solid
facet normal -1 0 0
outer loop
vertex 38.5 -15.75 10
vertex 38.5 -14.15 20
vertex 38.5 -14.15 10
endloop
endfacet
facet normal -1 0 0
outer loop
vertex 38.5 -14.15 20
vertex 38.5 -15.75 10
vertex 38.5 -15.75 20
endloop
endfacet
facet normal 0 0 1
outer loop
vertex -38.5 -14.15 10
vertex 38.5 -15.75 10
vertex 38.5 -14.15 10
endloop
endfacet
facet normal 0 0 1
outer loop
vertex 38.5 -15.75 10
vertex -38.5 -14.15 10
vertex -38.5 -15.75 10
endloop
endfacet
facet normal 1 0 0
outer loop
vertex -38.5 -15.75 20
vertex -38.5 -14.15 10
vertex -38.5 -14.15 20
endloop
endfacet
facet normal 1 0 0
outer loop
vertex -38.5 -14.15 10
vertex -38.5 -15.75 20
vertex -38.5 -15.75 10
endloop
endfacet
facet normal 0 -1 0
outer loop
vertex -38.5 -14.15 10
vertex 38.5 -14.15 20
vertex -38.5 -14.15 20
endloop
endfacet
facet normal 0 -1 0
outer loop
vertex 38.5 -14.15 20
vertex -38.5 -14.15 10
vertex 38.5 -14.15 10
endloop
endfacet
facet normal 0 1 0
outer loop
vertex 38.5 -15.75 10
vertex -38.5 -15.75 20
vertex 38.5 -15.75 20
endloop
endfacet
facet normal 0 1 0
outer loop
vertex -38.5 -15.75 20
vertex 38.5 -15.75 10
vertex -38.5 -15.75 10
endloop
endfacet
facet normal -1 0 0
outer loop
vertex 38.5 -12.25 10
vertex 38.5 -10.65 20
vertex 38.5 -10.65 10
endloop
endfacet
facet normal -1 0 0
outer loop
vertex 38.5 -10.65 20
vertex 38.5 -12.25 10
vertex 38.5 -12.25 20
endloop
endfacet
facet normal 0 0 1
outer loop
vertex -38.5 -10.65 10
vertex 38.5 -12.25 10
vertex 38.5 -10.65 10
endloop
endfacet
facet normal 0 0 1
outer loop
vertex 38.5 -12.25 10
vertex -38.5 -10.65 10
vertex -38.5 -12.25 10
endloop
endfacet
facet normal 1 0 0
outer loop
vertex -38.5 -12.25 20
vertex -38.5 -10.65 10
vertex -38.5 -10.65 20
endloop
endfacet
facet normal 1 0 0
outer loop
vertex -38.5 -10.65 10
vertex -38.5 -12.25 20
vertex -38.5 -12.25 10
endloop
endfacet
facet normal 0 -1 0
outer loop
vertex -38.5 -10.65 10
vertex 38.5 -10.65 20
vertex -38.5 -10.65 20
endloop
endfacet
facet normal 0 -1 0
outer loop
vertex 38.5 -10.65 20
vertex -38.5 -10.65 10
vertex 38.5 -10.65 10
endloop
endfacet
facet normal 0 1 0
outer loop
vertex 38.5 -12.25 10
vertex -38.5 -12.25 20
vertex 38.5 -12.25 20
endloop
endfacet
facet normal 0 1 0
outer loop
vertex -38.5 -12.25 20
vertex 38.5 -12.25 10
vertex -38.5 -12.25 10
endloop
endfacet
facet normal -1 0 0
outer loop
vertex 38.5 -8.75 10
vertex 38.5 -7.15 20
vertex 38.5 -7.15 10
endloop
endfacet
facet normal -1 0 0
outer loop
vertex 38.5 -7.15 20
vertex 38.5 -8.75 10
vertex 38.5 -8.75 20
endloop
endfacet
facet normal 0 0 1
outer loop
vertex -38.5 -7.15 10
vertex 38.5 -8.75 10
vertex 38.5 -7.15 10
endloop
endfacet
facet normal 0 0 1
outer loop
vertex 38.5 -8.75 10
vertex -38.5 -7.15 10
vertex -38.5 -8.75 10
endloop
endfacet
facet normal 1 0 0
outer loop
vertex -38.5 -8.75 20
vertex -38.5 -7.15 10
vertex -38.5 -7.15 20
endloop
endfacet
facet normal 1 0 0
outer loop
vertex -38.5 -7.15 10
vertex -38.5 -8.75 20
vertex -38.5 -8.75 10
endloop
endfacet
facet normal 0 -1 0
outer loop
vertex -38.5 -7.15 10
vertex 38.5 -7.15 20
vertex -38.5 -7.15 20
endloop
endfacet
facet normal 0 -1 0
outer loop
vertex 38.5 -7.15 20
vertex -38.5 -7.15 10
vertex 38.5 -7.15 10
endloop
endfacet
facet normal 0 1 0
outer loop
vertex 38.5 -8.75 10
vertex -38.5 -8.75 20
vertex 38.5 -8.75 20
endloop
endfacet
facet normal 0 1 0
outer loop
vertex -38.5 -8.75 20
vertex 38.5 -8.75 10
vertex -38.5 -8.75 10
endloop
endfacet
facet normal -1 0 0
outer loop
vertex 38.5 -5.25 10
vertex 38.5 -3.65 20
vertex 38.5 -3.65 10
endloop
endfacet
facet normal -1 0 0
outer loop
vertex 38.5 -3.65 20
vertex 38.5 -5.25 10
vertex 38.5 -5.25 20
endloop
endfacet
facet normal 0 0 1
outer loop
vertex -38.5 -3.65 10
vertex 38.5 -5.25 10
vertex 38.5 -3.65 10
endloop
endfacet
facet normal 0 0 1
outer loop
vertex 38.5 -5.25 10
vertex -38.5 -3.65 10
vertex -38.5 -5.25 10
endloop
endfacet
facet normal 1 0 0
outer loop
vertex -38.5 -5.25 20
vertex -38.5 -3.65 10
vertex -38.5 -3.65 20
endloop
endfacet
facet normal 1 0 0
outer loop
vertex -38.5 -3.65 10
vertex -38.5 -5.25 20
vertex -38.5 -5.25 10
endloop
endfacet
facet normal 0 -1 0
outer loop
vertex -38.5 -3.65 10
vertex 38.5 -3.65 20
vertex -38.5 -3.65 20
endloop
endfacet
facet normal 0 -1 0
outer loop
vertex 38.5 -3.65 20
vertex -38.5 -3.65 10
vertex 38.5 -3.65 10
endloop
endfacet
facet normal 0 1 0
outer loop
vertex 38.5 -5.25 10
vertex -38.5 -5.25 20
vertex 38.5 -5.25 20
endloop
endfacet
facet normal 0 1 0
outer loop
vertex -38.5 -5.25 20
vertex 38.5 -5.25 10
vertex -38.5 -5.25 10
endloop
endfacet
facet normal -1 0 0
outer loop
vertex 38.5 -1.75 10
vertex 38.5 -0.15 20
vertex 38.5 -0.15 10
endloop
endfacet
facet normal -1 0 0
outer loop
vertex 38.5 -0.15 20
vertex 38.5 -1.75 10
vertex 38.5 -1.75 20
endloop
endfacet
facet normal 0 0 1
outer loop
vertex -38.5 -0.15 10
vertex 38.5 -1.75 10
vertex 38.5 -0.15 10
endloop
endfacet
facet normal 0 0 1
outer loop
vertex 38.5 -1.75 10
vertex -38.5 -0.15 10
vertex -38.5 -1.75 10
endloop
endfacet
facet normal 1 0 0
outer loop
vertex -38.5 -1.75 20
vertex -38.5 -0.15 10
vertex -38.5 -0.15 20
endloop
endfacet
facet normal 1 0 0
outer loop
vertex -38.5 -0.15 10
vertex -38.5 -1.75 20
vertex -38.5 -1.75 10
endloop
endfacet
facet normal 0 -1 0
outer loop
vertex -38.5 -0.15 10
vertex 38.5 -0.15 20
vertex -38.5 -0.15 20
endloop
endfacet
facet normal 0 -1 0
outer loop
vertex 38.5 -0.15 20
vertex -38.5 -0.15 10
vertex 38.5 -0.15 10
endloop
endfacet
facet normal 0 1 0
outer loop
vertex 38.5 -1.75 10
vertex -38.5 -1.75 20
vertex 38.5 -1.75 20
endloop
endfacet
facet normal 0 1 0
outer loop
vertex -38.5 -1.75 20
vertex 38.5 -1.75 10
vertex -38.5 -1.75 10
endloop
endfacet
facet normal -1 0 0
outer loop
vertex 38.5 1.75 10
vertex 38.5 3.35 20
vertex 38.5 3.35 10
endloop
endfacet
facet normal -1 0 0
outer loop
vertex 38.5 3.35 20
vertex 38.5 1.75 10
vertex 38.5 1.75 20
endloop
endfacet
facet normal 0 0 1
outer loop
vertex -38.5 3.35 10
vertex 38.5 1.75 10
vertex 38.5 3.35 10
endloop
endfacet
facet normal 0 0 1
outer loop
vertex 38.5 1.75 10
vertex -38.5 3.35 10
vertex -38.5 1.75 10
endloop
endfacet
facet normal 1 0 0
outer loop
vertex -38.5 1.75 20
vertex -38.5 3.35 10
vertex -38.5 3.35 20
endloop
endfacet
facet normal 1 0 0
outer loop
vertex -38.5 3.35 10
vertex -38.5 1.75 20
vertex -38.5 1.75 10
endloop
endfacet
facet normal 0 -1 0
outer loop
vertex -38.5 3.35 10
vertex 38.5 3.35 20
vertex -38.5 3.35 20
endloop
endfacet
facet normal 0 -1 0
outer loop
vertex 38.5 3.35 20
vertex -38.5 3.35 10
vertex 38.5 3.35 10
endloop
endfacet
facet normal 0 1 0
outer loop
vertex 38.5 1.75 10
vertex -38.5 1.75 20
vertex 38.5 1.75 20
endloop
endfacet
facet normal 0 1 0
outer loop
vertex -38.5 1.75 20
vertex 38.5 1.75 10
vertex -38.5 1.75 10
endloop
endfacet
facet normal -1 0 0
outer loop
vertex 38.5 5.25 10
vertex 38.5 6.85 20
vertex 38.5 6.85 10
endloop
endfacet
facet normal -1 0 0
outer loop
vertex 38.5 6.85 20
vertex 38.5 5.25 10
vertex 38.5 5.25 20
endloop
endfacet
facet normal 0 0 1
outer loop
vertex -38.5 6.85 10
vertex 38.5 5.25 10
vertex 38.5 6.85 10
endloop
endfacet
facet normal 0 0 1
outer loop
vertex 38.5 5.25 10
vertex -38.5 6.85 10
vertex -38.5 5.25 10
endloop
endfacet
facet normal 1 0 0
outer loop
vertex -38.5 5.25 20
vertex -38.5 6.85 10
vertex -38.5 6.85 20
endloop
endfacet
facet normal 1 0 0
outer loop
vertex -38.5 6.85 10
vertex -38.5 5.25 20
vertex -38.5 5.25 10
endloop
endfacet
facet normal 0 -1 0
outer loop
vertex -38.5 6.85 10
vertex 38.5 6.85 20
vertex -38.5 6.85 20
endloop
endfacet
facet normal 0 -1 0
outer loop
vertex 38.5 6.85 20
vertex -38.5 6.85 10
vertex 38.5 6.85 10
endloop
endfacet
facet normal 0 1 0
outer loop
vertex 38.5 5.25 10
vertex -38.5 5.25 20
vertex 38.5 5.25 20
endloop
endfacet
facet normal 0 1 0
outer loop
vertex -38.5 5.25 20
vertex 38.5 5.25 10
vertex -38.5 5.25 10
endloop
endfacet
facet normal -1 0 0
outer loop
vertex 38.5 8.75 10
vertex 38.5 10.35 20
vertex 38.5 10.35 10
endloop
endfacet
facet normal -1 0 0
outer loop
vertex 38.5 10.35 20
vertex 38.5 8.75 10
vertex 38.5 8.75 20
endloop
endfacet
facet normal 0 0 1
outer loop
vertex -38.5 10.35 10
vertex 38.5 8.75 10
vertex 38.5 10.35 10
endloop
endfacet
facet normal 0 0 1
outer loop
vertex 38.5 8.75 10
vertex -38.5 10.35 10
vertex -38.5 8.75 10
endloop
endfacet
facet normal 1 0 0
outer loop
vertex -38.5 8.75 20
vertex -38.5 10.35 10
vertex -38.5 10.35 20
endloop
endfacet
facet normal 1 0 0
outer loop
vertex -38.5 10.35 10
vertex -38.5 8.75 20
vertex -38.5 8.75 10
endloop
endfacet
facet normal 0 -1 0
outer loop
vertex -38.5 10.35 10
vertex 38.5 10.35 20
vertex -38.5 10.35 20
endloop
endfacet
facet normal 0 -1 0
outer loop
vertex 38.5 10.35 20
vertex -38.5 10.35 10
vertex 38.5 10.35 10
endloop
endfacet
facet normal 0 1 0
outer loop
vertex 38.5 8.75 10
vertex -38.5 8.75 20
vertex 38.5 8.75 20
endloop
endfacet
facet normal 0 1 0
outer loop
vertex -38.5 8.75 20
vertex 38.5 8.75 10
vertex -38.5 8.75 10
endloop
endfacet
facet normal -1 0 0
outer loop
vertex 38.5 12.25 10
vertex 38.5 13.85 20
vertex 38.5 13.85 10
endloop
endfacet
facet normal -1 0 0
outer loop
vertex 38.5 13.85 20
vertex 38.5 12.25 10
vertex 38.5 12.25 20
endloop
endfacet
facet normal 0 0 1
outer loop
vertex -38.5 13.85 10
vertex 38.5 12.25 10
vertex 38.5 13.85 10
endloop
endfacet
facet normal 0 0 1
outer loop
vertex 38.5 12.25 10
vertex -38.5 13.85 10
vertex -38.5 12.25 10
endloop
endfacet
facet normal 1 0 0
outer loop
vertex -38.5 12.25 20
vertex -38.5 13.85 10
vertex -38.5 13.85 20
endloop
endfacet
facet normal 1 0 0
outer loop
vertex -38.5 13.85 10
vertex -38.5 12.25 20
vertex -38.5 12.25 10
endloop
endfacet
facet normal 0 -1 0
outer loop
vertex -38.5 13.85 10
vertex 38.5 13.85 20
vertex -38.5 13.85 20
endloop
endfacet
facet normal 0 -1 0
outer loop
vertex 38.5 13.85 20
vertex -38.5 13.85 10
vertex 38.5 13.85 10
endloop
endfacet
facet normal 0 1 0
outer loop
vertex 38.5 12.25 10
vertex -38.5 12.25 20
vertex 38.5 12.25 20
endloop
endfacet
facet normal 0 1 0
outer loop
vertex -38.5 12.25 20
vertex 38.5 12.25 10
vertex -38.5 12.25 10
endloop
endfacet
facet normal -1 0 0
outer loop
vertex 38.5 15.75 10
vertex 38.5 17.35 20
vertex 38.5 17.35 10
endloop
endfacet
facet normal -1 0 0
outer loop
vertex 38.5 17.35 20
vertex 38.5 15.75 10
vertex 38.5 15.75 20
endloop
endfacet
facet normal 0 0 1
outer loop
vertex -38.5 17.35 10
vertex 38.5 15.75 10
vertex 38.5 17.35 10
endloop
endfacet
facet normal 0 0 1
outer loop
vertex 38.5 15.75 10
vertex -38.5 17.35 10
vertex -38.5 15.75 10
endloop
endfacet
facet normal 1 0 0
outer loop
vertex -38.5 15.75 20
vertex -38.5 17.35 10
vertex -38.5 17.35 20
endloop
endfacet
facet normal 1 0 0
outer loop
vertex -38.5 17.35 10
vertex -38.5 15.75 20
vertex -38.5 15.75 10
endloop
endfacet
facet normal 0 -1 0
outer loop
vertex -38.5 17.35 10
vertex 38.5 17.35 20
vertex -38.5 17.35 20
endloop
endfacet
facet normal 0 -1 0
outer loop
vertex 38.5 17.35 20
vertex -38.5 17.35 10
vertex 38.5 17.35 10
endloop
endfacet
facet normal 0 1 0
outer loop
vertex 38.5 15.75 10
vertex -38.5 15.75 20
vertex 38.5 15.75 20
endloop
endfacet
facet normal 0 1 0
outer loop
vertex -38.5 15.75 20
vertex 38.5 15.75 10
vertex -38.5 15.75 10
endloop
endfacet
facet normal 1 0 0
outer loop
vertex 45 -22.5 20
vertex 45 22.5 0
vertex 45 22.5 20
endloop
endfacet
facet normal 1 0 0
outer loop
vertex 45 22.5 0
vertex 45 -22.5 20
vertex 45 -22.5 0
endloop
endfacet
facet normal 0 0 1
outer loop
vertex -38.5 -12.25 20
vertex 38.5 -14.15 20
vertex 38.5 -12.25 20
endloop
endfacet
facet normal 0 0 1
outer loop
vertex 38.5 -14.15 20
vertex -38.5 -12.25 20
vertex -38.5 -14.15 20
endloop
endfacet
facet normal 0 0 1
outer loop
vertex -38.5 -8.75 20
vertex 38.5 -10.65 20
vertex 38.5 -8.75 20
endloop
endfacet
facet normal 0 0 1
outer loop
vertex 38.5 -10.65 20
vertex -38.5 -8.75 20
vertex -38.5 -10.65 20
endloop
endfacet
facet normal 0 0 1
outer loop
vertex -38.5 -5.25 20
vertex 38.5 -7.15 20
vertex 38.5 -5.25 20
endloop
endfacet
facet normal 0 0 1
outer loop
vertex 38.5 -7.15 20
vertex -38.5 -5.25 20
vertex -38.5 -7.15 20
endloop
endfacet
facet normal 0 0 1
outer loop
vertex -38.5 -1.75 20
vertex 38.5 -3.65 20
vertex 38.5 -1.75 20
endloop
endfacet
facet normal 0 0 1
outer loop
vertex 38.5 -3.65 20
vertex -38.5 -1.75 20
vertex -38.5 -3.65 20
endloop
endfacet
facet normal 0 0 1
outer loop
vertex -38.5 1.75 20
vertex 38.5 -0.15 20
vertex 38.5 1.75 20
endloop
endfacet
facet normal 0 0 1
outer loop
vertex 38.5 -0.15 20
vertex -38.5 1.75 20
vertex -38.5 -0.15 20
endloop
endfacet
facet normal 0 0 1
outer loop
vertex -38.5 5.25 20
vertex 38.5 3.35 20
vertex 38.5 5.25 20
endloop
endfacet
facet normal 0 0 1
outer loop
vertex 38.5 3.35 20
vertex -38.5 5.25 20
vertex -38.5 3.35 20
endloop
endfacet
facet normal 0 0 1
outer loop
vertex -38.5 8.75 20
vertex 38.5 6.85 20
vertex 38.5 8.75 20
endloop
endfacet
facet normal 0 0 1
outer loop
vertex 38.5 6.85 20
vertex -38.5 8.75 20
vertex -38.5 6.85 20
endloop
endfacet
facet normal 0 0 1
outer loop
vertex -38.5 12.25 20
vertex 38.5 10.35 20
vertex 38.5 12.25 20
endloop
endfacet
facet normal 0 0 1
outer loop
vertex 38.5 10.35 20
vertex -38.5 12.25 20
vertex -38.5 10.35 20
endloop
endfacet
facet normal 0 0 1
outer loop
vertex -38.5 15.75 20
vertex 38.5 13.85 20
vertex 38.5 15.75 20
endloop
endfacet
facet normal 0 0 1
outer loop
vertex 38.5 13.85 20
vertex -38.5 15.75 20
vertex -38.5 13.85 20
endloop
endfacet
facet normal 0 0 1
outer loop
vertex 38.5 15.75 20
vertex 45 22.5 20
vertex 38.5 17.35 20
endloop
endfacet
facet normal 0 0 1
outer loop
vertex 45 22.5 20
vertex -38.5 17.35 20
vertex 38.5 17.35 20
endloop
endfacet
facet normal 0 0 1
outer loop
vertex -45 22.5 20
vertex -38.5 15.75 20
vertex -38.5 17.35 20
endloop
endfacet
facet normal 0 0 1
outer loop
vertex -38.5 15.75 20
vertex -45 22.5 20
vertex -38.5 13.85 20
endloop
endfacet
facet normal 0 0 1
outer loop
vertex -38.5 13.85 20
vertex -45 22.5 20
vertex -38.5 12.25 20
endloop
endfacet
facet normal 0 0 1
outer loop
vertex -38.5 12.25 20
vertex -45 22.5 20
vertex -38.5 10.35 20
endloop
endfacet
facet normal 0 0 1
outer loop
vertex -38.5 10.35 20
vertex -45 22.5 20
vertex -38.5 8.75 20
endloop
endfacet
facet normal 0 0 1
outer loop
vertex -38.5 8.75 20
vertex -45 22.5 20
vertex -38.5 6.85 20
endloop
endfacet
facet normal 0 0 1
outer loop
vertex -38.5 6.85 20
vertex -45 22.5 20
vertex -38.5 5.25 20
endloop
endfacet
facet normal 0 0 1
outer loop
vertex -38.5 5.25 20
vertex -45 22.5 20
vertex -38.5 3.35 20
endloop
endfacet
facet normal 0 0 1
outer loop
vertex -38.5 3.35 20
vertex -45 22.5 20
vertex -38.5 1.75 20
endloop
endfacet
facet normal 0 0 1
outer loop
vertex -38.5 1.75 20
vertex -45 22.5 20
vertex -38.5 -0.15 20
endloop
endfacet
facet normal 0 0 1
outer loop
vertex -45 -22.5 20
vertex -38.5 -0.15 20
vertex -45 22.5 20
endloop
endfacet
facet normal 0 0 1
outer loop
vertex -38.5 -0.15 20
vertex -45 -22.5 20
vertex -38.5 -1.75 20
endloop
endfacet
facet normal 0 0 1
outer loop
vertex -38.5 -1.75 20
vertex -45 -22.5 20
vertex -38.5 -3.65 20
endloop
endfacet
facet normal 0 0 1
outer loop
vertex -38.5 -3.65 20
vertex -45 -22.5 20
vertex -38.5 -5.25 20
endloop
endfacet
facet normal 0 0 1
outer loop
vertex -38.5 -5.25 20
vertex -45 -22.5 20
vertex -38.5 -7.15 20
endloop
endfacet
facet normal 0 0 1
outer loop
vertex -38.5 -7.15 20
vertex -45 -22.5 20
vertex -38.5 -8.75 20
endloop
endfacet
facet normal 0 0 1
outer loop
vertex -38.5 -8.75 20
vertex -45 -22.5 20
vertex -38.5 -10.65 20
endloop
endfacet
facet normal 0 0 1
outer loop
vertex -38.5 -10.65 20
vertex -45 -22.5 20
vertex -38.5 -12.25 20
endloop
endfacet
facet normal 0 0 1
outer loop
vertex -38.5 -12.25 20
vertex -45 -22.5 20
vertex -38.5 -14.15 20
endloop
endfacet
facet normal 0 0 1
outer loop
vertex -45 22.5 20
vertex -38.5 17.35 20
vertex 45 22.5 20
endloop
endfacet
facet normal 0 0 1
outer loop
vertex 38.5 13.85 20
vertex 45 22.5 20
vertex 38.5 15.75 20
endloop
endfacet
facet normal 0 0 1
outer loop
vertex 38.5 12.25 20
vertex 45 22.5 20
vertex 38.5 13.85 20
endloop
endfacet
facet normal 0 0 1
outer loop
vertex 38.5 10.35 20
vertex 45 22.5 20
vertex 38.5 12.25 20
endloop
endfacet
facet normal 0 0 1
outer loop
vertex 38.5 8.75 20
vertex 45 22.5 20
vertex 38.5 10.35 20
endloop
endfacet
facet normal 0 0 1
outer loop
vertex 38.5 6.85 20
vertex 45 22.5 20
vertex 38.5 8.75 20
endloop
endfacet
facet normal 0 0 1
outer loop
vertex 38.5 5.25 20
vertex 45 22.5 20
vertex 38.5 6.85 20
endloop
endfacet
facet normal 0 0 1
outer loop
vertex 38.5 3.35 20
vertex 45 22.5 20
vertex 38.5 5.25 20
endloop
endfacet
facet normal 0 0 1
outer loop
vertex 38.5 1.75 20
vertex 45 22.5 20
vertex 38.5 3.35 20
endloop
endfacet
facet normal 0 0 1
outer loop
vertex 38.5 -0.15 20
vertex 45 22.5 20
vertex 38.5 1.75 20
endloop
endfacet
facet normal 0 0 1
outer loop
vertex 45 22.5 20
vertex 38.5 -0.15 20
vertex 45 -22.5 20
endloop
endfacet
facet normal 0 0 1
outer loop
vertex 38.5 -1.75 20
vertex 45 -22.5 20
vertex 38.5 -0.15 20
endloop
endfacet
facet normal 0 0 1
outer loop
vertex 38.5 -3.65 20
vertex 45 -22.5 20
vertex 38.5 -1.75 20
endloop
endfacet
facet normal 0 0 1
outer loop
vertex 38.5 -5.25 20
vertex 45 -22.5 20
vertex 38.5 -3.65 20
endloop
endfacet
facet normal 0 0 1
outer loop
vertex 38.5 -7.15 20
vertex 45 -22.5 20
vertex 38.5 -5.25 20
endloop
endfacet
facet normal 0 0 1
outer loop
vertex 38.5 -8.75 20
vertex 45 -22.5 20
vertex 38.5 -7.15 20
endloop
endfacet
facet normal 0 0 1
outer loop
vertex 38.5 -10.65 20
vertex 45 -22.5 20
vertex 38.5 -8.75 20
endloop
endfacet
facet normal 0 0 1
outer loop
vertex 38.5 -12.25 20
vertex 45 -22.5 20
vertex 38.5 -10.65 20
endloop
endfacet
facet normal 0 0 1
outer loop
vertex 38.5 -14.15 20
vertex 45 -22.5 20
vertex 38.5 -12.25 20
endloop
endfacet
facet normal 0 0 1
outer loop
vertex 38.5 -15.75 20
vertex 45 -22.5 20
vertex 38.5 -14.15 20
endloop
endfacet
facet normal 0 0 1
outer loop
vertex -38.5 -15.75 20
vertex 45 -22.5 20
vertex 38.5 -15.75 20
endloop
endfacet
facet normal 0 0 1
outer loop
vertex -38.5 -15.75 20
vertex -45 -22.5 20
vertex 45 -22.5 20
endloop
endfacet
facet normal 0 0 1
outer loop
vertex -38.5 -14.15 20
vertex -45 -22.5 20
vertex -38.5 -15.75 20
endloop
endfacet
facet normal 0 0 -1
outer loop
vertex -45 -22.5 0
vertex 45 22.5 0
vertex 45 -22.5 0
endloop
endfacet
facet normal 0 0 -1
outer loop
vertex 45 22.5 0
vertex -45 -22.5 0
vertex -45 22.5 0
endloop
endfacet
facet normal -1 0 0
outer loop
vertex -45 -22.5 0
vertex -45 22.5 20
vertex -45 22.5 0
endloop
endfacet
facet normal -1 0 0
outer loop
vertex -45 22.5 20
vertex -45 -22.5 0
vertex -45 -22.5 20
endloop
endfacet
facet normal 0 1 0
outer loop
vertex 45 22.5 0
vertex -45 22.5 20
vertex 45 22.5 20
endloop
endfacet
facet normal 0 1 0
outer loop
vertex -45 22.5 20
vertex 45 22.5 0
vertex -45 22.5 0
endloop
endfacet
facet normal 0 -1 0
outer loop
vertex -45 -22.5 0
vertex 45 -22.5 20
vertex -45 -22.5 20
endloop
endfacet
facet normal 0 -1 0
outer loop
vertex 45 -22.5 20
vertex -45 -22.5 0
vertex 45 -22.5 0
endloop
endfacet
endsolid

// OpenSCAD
// Microscope slide drying rack
// 10 slides stand upright on their long edge, side by side

// ---- Block ----
block_l = 90;    // X length of base block (mm)
block_w = 45;    // Y width of base block (mm)
block_h = 20;    // Z height of base block (mm)

// ---- Slots ----
slot_n     = 10;   // number of slots
slot_len   = 77;   // slot length along X (mm)
slot_w     = 1.6;  // slot width along Y (mm)
slot_depth = 10;   // slot depth from top face (mm)
slot_pitch = 3.5;  // centre-to-centre spacing along Y (mm)

// ---- Misc ----
eps = 0.5;        // overcut past faces to avoid coplanar surfaces (mm)

difference() {
    // Base block, centred in X/Y, resting on z = 0
    translate([-block_l/2, -block_w/2, 0])
        cube([block_l, block_w, block_h]);

    // Slots running along X, open at the top
    for (i = [0 : slot_n - 1]) {
        y = (i - (slot_n - 1)/2) * slot_pitch;
        translate([-slot_len/2, y, block_h - slot_depth])
            cube([slot_len, slot_w, slot_depth + eps]);
    }
}
